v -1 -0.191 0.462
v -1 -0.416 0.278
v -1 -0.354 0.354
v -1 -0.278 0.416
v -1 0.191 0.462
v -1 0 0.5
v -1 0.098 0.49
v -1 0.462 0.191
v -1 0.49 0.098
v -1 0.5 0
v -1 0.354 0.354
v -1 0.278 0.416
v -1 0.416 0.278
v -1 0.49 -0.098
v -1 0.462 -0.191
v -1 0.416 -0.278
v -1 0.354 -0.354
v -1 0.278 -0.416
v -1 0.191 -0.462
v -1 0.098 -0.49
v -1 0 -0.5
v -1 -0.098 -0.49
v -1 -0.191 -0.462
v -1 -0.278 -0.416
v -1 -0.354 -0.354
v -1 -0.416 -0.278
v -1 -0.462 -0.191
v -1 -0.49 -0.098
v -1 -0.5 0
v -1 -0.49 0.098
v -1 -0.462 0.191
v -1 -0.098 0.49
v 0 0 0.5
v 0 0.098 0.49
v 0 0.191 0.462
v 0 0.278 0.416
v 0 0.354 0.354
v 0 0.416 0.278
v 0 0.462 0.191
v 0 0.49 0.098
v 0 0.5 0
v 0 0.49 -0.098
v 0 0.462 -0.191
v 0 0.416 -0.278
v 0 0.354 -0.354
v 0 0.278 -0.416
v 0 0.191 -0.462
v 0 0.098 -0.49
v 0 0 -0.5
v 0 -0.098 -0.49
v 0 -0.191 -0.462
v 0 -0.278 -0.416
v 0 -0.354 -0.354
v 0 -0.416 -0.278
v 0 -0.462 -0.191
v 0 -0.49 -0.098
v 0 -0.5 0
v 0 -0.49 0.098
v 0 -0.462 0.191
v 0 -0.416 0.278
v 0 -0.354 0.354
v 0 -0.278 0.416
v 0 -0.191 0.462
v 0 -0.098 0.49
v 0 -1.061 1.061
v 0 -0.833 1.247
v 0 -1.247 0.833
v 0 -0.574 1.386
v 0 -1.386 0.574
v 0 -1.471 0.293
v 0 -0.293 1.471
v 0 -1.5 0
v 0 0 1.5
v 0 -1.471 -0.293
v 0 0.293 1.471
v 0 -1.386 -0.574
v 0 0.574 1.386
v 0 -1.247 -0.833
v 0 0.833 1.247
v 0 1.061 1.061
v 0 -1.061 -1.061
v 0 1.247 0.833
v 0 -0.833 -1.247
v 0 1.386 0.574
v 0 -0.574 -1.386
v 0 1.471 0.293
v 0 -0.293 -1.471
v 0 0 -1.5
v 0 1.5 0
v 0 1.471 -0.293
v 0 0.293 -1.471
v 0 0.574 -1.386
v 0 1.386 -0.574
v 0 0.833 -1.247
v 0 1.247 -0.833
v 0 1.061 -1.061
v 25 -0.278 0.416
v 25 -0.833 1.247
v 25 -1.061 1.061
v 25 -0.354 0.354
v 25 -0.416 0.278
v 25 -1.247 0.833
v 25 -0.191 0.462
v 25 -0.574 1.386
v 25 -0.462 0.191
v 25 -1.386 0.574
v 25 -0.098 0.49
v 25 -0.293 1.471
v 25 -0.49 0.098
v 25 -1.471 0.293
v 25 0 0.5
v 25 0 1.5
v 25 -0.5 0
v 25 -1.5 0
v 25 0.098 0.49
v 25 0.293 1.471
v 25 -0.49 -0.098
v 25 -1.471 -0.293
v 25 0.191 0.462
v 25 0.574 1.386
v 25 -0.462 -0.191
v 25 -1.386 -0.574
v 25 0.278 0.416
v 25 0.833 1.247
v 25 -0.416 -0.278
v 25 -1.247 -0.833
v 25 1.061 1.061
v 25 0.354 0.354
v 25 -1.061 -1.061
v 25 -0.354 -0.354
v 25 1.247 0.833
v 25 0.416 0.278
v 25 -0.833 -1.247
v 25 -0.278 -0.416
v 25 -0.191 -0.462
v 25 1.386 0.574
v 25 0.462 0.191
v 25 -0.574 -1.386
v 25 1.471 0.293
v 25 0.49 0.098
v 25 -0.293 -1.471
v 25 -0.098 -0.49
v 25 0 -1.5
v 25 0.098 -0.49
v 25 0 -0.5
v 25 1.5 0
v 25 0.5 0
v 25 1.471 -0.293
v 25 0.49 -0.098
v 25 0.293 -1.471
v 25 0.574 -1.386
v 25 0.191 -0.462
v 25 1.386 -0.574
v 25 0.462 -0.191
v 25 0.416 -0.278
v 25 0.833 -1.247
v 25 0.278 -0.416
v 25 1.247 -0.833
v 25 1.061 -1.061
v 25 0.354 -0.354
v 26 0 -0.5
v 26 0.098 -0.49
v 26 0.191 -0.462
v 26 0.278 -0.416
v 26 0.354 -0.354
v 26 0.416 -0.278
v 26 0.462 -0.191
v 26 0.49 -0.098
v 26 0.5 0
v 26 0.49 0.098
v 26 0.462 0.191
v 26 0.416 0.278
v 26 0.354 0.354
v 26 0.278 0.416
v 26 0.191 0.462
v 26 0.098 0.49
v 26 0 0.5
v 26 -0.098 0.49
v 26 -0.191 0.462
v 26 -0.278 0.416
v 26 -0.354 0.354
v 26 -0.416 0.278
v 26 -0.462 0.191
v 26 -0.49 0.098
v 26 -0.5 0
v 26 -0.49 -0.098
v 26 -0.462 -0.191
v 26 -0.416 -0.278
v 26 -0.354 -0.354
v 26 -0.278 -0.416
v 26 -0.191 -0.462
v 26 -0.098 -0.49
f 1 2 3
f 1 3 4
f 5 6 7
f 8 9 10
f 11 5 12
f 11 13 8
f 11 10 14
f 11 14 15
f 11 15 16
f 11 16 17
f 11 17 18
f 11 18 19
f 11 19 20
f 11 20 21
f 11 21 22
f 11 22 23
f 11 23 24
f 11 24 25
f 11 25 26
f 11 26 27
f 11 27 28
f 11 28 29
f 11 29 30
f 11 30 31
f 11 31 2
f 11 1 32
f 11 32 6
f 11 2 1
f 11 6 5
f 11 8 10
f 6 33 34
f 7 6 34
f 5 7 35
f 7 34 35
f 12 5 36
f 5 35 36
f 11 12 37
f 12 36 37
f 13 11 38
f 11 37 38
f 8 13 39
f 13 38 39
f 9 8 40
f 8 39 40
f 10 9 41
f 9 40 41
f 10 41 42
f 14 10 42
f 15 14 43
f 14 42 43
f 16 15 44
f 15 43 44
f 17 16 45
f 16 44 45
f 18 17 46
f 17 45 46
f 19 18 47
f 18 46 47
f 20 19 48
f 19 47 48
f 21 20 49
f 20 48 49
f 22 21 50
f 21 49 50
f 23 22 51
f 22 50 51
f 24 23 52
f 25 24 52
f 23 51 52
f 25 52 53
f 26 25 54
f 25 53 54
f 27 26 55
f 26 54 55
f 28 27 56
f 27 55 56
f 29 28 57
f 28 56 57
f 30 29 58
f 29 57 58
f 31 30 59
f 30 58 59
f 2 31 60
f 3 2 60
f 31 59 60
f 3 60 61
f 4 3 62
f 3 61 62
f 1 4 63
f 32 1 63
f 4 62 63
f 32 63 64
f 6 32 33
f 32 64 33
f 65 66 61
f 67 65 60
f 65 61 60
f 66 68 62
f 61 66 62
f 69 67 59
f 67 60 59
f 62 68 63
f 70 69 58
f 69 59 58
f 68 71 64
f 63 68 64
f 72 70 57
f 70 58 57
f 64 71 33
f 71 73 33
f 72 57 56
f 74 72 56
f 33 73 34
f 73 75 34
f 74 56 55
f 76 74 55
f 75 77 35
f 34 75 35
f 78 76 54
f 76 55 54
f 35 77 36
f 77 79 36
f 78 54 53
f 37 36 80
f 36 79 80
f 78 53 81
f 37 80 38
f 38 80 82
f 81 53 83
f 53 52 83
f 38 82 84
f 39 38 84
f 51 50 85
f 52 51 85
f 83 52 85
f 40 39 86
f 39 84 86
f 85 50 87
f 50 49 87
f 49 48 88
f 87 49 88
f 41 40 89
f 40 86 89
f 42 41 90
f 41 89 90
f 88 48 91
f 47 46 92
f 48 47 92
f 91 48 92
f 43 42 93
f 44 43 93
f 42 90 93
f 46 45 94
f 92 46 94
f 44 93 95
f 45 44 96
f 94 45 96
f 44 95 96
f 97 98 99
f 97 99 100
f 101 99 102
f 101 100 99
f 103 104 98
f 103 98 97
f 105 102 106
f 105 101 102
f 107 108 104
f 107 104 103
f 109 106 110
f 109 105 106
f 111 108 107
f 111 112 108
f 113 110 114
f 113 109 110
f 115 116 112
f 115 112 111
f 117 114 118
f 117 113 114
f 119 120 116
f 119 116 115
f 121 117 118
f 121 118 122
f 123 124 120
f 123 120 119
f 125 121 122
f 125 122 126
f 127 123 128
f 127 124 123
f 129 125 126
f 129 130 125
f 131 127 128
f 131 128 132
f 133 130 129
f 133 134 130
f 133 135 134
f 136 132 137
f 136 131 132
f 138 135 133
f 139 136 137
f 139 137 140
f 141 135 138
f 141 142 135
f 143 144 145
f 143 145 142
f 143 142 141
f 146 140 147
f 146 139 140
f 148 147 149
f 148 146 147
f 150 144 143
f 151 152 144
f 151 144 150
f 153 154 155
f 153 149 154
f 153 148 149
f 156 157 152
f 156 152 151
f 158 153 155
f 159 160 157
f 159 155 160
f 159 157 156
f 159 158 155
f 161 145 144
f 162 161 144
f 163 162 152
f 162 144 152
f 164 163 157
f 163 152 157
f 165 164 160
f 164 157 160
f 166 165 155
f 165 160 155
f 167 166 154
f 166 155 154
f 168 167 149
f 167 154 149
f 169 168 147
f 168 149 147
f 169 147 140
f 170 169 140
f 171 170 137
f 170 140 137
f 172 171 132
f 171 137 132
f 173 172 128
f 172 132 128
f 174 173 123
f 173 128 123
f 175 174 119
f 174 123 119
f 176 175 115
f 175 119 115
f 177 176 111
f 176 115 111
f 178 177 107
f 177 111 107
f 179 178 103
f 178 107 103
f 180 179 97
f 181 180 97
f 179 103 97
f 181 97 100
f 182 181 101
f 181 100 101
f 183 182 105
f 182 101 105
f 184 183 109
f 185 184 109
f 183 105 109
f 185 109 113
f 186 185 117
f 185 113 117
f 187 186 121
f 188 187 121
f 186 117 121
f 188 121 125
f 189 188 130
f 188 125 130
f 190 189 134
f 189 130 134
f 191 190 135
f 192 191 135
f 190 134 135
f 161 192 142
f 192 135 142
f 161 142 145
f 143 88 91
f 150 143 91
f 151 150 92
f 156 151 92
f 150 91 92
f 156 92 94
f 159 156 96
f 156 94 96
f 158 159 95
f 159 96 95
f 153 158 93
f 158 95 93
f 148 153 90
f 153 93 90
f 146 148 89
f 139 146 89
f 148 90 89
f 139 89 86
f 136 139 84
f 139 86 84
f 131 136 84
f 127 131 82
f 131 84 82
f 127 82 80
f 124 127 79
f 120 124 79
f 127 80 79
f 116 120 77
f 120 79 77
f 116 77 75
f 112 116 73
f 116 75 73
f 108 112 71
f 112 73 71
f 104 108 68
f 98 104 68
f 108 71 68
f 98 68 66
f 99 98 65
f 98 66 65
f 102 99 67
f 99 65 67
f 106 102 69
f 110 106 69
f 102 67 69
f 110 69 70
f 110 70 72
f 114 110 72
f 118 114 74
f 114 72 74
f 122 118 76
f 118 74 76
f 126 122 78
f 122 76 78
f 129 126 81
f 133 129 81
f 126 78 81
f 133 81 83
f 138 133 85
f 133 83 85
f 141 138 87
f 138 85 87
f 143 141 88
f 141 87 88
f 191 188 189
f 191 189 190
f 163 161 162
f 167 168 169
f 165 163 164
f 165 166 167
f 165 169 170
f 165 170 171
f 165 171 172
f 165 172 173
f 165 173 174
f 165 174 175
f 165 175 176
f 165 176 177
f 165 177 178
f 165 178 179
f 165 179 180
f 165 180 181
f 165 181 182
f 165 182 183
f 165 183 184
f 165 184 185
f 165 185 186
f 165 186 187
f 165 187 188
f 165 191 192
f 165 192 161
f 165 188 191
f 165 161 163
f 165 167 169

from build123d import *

# Parameters (mm, degrees)
CROQUIS1_R              = 1.5
SALIENTE_EXTRUIR1_DEPTH = 25
CROQUIS2_R              = 0.5
SALIENTE_EXTRUIR2_DEPTH = 1
CROQUIS3_R              = 0.5
SALIENTE_EXTRUIR3_DEPTH = 1


with BuildPart() as part:
    # Croquis1 → Saliente-Extruir1 (new body)
    with BuildSketch(Plane(origin=(0, 0, 0), x_dir=(0, 0, -1), z_dir=(1, 0, 0))):
        Circle(CROQUIS1_R)
    extrude(amount=SALIENTE_EXTRUIR1_DEPTH)

    # Croquis2 → Saliente-Extruir2 (add)
    with BuildSketch(Plane(origin=(25, 0, 0), x_dir=(0, 0, -1), z_dir=(1, 0, 0))):
        Circle(CROQUIS2_R)
    extrude(amount=SALIENTE_EXTRUIR2_DEPTH)

    # Croquis3 → Saliente-Extruir3 (add)
    with BuildSketch(Plane.ZY):
        Circle(CROQUIS3_R)
    extrude(amount=SALIENTE_EXTRUIR3_DEPTH)


solid = part.part
